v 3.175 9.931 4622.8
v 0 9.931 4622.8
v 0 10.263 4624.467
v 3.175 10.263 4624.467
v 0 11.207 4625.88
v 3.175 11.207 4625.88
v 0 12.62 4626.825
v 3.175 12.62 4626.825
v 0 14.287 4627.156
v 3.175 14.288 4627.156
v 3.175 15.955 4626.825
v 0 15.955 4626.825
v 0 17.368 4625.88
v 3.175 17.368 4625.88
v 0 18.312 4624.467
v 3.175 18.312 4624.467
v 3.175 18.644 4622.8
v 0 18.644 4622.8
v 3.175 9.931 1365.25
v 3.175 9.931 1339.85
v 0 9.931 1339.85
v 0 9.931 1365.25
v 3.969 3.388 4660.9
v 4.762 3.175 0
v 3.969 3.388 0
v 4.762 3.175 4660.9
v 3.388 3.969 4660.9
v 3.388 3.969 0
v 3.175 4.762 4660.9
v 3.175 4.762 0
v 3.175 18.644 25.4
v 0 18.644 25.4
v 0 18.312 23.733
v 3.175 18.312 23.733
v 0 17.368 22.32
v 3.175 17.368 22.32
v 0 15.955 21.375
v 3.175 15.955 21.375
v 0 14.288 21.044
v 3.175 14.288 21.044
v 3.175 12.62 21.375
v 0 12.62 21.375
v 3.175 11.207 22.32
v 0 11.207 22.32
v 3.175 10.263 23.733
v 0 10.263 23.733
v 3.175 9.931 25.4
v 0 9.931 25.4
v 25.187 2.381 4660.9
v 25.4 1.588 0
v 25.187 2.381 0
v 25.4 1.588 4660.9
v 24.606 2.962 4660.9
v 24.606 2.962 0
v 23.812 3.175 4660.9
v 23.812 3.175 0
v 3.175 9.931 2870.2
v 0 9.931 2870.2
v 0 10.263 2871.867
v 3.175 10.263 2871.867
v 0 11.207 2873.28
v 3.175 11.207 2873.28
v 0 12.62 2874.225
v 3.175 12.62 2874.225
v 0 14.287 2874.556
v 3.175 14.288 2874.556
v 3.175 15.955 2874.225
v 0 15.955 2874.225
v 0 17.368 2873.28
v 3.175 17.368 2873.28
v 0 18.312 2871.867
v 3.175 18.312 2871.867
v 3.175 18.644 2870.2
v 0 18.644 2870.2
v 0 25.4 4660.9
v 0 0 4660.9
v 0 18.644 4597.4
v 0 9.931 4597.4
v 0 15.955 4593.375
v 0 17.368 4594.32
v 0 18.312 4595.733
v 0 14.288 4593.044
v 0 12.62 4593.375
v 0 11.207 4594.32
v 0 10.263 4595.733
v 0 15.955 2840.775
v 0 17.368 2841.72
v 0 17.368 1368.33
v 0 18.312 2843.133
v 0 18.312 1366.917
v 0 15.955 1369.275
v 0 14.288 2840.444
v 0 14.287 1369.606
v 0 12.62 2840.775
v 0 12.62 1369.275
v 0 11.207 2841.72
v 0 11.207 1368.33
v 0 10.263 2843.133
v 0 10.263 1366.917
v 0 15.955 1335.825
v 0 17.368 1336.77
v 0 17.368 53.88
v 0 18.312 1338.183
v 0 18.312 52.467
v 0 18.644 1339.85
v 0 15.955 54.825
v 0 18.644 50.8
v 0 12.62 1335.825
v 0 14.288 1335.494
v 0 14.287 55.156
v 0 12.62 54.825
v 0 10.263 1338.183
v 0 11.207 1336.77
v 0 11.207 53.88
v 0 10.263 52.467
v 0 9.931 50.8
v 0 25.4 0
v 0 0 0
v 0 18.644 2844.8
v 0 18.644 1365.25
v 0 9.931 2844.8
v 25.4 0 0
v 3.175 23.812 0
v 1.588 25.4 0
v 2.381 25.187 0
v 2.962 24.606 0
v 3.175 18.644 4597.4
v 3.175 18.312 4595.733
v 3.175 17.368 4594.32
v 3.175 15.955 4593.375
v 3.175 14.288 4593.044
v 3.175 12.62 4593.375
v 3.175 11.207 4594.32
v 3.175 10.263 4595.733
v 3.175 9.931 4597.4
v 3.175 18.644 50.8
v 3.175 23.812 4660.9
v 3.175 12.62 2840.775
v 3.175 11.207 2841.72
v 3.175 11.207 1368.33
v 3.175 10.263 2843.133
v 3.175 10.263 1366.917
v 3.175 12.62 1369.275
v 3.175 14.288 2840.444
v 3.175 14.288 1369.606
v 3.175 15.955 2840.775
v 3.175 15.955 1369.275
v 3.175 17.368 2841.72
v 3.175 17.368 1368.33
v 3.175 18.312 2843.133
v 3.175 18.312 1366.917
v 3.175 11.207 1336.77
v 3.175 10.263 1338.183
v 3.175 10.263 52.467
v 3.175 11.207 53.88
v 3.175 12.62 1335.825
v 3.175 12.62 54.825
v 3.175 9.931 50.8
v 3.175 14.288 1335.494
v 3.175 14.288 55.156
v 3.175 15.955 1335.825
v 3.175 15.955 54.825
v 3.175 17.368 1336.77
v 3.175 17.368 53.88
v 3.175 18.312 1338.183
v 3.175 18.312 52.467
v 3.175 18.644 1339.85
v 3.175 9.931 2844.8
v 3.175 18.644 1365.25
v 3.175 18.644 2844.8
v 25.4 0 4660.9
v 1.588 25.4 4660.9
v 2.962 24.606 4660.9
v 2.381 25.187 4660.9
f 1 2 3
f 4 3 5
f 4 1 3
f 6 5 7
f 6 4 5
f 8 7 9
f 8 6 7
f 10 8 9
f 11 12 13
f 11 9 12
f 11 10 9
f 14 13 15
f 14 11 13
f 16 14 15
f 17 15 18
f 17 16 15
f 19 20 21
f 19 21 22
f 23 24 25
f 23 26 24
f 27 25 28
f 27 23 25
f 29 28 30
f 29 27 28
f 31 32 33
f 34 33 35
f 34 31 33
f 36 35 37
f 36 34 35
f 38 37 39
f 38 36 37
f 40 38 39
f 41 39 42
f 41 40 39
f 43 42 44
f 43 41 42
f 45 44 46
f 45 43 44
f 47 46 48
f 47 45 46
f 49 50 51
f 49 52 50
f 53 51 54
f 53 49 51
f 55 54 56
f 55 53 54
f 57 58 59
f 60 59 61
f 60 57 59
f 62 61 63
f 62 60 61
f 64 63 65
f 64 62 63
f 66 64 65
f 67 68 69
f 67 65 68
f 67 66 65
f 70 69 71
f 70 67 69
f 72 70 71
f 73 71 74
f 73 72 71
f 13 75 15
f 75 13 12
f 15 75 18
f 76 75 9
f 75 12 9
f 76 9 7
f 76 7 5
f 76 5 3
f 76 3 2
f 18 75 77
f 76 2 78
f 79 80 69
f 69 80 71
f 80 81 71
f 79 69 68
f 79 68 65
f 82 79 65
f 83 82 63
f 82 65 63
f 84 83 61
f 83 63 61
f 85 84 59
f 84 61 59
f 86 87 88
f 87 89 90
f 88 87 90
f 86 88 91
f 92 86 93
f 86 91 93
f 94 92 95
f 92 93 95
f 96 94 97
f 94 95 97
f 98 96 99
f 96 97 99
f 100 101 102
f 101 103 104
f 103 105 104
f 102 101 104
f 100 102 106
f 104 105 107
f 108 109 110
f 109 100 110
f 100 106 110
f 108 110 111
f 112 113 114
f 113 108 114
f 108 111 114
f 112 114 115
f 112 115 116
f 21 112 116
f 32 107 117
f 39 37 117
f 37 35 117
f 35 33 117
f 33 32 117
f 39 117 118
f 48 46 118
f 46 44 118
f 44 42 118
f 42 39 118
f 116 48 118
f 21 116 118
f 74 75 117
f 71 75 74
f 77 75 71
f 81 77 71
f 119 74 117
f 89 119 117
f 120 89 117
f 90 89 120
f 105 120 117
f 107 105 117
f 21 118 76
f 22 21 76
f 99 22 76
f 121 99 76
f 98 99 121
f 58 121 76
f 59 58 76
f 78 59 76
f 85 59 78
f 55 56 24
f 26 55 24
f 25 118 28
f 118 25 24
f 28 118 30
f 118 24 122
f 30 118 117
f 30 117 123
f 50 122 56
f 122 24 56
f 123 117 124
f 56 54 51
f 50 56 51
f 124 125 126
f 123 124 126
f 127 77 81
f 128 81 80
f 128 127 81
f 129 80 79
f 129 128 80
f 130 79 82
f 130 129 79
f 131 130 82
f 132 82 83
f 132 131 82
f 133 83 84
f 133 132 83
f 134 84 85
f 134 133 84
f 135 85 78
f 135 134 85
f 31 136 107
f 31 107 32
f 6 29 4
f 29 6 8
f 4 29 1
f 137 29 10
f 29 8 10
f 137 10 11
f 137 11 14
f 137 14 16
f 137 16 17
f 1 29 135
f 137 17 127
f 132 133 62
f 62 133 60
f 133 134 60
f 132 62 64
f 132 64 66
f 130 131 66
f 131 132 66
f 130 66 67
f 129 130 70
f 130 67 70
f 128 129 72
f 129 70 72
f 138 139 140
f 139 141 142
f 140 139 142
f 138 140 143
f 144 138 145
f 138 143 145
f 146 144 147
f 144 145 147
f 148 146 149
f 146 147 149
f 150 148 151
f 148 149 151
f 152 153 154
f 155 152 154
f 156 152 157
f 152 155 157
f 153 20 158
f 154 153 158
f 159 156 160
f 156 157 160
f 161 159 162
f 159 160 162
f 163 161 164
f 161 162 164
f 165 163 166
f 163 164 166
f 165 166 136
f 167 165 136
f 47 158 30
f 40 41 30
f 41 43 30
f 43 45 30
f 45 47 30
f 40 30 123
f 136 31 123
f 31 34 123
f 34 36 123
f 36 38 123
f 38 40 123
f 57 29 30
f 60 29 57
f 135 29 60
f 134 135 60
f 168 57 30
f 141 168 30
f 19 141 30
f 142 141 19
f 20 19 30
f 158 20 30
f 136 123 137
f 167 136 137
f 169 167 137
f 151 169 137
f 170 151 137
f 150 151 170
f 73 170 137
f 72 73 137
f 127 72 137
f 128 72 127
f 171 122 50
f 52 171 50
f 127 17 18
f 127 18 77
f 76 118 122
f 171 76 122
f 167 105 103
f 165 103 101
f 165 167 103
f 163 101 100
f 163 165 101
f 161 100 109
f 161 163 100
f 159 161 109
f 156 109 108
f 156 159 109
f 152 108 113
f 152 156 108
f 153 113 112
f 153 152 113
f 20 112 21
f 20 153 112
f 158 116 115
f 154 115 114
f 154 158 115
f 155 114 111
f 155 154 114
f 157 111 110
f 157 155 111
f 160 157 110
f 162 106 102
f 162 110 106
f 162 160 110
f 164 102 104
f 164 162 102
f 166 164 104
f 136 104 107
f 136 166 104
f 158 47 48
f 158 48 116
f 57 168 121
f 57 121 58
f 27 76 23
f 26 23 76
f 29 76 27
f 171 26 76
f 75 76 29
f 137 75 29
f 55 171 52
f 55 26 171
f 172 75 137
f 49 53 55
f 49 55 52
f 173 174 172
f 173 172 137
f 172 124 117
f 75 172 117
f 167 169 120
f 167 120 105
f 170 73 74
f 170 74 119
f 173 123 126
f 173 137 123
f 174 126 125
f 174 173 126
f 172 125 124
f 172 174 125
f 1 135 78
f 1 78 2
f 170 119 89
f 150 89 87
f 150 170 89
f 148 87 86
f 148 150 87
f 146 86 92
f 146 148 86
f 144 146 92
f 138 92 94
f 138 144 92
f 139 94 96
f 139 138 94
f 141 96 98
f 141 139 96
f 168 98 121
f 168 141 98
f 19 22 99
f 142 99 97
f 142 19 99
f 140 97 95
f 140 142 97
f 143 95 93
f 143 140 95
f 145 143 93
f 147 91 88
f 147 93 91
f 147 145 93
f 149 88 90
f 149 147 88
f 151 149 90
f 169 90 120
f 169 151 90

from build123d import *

# Parameters (mm, degrees)
EXTRUDE_THIN1_DEPTH = 4660.9
FILLET1_R           = 1.5875
SLOT_DEPTH          = 4.175
SLOT_2_COUNT        = 2
SLOT_2_PITCH        = 1314.45
SLOT_3_COUNT        = 2
SLOT_3_PITCH        = 2819.4
SLOT_4_COUNT        = 2
SLOT_4_PITCH        = 4572


with BuildPart() as part:
    # Sketch1 → Extrude-Thin1 (new body)
    with BuildSketch(Plane.XY):
        Polygon((0, 25.4), (0, 0), (25.4, 0), (25.4, 3.175), (3.175, 3.175), (3.175, 25.4), align=None)
    extrude(amount=EXTRUDE_THIN1_DEPTH)

    # Fillet1
    fillet1_edges = [part.edges().sort_by_distance(p)[0] for p in [
        (3.175, 3.175, 2330.45),
        (25.4, 3.175, 2330.45),
        (3.175, 25.4, 2330.45),
    ]]
    fillet(fillet1_edges, radius=FILLET1_R)

    # SlotSketch → Slot (cut, through all)
    with BuildSketch(Plane(origin=(3.175, 23.635931813, 4673.560828074), x_dir=(0, 1, 0), z_dir=(1, 0, 0))):
        with BuildLine():
            Line((-4.992331813, -4622.760828074), (-4.992331813, -4648.160828074))
            ThreePointArc((-4.992331813, -4648.160828074), (-9.348431813, -4652.516928074), (-13.704531813, -4648.160828074))
            Line((-13.704531813, -4648.160828074), (-13.704531813, -4622.760828074))
            ThreePointArc((-13.704531813, -4622.760828074), (-9.348431813, -4618.404728074), (-4.992331813, -4622.760828074))
        make_face()
    slot = extrude(amount=-SLOT_DEPTH, mode=Mode.SUBTRACT)

    # Slot 2: Slot ×2
    with Locations(*[(0, 0, i * SLOT_2_PITCH) for i in range(1, SLOT_2_COUNT)]):
        add(slot, mode=Mode.SUBTRACT)

    # Slot 3: Slot ×2
    with Locations(*[(0, 0, i * SLOT_3_PITCH) for i in range(1, SLOT_3_COUNT)]):
        add(slot, mode=Mode.SUBTRACT)

    # Slot 4: Slot ×2
    with Locations(*[(0, 0, i * SLOT_4_PITCH) for i in range(1, SLOT_4_COUNT)]):
        add(slot, mode=Mode.SUBTRACT)


solid = part.part
